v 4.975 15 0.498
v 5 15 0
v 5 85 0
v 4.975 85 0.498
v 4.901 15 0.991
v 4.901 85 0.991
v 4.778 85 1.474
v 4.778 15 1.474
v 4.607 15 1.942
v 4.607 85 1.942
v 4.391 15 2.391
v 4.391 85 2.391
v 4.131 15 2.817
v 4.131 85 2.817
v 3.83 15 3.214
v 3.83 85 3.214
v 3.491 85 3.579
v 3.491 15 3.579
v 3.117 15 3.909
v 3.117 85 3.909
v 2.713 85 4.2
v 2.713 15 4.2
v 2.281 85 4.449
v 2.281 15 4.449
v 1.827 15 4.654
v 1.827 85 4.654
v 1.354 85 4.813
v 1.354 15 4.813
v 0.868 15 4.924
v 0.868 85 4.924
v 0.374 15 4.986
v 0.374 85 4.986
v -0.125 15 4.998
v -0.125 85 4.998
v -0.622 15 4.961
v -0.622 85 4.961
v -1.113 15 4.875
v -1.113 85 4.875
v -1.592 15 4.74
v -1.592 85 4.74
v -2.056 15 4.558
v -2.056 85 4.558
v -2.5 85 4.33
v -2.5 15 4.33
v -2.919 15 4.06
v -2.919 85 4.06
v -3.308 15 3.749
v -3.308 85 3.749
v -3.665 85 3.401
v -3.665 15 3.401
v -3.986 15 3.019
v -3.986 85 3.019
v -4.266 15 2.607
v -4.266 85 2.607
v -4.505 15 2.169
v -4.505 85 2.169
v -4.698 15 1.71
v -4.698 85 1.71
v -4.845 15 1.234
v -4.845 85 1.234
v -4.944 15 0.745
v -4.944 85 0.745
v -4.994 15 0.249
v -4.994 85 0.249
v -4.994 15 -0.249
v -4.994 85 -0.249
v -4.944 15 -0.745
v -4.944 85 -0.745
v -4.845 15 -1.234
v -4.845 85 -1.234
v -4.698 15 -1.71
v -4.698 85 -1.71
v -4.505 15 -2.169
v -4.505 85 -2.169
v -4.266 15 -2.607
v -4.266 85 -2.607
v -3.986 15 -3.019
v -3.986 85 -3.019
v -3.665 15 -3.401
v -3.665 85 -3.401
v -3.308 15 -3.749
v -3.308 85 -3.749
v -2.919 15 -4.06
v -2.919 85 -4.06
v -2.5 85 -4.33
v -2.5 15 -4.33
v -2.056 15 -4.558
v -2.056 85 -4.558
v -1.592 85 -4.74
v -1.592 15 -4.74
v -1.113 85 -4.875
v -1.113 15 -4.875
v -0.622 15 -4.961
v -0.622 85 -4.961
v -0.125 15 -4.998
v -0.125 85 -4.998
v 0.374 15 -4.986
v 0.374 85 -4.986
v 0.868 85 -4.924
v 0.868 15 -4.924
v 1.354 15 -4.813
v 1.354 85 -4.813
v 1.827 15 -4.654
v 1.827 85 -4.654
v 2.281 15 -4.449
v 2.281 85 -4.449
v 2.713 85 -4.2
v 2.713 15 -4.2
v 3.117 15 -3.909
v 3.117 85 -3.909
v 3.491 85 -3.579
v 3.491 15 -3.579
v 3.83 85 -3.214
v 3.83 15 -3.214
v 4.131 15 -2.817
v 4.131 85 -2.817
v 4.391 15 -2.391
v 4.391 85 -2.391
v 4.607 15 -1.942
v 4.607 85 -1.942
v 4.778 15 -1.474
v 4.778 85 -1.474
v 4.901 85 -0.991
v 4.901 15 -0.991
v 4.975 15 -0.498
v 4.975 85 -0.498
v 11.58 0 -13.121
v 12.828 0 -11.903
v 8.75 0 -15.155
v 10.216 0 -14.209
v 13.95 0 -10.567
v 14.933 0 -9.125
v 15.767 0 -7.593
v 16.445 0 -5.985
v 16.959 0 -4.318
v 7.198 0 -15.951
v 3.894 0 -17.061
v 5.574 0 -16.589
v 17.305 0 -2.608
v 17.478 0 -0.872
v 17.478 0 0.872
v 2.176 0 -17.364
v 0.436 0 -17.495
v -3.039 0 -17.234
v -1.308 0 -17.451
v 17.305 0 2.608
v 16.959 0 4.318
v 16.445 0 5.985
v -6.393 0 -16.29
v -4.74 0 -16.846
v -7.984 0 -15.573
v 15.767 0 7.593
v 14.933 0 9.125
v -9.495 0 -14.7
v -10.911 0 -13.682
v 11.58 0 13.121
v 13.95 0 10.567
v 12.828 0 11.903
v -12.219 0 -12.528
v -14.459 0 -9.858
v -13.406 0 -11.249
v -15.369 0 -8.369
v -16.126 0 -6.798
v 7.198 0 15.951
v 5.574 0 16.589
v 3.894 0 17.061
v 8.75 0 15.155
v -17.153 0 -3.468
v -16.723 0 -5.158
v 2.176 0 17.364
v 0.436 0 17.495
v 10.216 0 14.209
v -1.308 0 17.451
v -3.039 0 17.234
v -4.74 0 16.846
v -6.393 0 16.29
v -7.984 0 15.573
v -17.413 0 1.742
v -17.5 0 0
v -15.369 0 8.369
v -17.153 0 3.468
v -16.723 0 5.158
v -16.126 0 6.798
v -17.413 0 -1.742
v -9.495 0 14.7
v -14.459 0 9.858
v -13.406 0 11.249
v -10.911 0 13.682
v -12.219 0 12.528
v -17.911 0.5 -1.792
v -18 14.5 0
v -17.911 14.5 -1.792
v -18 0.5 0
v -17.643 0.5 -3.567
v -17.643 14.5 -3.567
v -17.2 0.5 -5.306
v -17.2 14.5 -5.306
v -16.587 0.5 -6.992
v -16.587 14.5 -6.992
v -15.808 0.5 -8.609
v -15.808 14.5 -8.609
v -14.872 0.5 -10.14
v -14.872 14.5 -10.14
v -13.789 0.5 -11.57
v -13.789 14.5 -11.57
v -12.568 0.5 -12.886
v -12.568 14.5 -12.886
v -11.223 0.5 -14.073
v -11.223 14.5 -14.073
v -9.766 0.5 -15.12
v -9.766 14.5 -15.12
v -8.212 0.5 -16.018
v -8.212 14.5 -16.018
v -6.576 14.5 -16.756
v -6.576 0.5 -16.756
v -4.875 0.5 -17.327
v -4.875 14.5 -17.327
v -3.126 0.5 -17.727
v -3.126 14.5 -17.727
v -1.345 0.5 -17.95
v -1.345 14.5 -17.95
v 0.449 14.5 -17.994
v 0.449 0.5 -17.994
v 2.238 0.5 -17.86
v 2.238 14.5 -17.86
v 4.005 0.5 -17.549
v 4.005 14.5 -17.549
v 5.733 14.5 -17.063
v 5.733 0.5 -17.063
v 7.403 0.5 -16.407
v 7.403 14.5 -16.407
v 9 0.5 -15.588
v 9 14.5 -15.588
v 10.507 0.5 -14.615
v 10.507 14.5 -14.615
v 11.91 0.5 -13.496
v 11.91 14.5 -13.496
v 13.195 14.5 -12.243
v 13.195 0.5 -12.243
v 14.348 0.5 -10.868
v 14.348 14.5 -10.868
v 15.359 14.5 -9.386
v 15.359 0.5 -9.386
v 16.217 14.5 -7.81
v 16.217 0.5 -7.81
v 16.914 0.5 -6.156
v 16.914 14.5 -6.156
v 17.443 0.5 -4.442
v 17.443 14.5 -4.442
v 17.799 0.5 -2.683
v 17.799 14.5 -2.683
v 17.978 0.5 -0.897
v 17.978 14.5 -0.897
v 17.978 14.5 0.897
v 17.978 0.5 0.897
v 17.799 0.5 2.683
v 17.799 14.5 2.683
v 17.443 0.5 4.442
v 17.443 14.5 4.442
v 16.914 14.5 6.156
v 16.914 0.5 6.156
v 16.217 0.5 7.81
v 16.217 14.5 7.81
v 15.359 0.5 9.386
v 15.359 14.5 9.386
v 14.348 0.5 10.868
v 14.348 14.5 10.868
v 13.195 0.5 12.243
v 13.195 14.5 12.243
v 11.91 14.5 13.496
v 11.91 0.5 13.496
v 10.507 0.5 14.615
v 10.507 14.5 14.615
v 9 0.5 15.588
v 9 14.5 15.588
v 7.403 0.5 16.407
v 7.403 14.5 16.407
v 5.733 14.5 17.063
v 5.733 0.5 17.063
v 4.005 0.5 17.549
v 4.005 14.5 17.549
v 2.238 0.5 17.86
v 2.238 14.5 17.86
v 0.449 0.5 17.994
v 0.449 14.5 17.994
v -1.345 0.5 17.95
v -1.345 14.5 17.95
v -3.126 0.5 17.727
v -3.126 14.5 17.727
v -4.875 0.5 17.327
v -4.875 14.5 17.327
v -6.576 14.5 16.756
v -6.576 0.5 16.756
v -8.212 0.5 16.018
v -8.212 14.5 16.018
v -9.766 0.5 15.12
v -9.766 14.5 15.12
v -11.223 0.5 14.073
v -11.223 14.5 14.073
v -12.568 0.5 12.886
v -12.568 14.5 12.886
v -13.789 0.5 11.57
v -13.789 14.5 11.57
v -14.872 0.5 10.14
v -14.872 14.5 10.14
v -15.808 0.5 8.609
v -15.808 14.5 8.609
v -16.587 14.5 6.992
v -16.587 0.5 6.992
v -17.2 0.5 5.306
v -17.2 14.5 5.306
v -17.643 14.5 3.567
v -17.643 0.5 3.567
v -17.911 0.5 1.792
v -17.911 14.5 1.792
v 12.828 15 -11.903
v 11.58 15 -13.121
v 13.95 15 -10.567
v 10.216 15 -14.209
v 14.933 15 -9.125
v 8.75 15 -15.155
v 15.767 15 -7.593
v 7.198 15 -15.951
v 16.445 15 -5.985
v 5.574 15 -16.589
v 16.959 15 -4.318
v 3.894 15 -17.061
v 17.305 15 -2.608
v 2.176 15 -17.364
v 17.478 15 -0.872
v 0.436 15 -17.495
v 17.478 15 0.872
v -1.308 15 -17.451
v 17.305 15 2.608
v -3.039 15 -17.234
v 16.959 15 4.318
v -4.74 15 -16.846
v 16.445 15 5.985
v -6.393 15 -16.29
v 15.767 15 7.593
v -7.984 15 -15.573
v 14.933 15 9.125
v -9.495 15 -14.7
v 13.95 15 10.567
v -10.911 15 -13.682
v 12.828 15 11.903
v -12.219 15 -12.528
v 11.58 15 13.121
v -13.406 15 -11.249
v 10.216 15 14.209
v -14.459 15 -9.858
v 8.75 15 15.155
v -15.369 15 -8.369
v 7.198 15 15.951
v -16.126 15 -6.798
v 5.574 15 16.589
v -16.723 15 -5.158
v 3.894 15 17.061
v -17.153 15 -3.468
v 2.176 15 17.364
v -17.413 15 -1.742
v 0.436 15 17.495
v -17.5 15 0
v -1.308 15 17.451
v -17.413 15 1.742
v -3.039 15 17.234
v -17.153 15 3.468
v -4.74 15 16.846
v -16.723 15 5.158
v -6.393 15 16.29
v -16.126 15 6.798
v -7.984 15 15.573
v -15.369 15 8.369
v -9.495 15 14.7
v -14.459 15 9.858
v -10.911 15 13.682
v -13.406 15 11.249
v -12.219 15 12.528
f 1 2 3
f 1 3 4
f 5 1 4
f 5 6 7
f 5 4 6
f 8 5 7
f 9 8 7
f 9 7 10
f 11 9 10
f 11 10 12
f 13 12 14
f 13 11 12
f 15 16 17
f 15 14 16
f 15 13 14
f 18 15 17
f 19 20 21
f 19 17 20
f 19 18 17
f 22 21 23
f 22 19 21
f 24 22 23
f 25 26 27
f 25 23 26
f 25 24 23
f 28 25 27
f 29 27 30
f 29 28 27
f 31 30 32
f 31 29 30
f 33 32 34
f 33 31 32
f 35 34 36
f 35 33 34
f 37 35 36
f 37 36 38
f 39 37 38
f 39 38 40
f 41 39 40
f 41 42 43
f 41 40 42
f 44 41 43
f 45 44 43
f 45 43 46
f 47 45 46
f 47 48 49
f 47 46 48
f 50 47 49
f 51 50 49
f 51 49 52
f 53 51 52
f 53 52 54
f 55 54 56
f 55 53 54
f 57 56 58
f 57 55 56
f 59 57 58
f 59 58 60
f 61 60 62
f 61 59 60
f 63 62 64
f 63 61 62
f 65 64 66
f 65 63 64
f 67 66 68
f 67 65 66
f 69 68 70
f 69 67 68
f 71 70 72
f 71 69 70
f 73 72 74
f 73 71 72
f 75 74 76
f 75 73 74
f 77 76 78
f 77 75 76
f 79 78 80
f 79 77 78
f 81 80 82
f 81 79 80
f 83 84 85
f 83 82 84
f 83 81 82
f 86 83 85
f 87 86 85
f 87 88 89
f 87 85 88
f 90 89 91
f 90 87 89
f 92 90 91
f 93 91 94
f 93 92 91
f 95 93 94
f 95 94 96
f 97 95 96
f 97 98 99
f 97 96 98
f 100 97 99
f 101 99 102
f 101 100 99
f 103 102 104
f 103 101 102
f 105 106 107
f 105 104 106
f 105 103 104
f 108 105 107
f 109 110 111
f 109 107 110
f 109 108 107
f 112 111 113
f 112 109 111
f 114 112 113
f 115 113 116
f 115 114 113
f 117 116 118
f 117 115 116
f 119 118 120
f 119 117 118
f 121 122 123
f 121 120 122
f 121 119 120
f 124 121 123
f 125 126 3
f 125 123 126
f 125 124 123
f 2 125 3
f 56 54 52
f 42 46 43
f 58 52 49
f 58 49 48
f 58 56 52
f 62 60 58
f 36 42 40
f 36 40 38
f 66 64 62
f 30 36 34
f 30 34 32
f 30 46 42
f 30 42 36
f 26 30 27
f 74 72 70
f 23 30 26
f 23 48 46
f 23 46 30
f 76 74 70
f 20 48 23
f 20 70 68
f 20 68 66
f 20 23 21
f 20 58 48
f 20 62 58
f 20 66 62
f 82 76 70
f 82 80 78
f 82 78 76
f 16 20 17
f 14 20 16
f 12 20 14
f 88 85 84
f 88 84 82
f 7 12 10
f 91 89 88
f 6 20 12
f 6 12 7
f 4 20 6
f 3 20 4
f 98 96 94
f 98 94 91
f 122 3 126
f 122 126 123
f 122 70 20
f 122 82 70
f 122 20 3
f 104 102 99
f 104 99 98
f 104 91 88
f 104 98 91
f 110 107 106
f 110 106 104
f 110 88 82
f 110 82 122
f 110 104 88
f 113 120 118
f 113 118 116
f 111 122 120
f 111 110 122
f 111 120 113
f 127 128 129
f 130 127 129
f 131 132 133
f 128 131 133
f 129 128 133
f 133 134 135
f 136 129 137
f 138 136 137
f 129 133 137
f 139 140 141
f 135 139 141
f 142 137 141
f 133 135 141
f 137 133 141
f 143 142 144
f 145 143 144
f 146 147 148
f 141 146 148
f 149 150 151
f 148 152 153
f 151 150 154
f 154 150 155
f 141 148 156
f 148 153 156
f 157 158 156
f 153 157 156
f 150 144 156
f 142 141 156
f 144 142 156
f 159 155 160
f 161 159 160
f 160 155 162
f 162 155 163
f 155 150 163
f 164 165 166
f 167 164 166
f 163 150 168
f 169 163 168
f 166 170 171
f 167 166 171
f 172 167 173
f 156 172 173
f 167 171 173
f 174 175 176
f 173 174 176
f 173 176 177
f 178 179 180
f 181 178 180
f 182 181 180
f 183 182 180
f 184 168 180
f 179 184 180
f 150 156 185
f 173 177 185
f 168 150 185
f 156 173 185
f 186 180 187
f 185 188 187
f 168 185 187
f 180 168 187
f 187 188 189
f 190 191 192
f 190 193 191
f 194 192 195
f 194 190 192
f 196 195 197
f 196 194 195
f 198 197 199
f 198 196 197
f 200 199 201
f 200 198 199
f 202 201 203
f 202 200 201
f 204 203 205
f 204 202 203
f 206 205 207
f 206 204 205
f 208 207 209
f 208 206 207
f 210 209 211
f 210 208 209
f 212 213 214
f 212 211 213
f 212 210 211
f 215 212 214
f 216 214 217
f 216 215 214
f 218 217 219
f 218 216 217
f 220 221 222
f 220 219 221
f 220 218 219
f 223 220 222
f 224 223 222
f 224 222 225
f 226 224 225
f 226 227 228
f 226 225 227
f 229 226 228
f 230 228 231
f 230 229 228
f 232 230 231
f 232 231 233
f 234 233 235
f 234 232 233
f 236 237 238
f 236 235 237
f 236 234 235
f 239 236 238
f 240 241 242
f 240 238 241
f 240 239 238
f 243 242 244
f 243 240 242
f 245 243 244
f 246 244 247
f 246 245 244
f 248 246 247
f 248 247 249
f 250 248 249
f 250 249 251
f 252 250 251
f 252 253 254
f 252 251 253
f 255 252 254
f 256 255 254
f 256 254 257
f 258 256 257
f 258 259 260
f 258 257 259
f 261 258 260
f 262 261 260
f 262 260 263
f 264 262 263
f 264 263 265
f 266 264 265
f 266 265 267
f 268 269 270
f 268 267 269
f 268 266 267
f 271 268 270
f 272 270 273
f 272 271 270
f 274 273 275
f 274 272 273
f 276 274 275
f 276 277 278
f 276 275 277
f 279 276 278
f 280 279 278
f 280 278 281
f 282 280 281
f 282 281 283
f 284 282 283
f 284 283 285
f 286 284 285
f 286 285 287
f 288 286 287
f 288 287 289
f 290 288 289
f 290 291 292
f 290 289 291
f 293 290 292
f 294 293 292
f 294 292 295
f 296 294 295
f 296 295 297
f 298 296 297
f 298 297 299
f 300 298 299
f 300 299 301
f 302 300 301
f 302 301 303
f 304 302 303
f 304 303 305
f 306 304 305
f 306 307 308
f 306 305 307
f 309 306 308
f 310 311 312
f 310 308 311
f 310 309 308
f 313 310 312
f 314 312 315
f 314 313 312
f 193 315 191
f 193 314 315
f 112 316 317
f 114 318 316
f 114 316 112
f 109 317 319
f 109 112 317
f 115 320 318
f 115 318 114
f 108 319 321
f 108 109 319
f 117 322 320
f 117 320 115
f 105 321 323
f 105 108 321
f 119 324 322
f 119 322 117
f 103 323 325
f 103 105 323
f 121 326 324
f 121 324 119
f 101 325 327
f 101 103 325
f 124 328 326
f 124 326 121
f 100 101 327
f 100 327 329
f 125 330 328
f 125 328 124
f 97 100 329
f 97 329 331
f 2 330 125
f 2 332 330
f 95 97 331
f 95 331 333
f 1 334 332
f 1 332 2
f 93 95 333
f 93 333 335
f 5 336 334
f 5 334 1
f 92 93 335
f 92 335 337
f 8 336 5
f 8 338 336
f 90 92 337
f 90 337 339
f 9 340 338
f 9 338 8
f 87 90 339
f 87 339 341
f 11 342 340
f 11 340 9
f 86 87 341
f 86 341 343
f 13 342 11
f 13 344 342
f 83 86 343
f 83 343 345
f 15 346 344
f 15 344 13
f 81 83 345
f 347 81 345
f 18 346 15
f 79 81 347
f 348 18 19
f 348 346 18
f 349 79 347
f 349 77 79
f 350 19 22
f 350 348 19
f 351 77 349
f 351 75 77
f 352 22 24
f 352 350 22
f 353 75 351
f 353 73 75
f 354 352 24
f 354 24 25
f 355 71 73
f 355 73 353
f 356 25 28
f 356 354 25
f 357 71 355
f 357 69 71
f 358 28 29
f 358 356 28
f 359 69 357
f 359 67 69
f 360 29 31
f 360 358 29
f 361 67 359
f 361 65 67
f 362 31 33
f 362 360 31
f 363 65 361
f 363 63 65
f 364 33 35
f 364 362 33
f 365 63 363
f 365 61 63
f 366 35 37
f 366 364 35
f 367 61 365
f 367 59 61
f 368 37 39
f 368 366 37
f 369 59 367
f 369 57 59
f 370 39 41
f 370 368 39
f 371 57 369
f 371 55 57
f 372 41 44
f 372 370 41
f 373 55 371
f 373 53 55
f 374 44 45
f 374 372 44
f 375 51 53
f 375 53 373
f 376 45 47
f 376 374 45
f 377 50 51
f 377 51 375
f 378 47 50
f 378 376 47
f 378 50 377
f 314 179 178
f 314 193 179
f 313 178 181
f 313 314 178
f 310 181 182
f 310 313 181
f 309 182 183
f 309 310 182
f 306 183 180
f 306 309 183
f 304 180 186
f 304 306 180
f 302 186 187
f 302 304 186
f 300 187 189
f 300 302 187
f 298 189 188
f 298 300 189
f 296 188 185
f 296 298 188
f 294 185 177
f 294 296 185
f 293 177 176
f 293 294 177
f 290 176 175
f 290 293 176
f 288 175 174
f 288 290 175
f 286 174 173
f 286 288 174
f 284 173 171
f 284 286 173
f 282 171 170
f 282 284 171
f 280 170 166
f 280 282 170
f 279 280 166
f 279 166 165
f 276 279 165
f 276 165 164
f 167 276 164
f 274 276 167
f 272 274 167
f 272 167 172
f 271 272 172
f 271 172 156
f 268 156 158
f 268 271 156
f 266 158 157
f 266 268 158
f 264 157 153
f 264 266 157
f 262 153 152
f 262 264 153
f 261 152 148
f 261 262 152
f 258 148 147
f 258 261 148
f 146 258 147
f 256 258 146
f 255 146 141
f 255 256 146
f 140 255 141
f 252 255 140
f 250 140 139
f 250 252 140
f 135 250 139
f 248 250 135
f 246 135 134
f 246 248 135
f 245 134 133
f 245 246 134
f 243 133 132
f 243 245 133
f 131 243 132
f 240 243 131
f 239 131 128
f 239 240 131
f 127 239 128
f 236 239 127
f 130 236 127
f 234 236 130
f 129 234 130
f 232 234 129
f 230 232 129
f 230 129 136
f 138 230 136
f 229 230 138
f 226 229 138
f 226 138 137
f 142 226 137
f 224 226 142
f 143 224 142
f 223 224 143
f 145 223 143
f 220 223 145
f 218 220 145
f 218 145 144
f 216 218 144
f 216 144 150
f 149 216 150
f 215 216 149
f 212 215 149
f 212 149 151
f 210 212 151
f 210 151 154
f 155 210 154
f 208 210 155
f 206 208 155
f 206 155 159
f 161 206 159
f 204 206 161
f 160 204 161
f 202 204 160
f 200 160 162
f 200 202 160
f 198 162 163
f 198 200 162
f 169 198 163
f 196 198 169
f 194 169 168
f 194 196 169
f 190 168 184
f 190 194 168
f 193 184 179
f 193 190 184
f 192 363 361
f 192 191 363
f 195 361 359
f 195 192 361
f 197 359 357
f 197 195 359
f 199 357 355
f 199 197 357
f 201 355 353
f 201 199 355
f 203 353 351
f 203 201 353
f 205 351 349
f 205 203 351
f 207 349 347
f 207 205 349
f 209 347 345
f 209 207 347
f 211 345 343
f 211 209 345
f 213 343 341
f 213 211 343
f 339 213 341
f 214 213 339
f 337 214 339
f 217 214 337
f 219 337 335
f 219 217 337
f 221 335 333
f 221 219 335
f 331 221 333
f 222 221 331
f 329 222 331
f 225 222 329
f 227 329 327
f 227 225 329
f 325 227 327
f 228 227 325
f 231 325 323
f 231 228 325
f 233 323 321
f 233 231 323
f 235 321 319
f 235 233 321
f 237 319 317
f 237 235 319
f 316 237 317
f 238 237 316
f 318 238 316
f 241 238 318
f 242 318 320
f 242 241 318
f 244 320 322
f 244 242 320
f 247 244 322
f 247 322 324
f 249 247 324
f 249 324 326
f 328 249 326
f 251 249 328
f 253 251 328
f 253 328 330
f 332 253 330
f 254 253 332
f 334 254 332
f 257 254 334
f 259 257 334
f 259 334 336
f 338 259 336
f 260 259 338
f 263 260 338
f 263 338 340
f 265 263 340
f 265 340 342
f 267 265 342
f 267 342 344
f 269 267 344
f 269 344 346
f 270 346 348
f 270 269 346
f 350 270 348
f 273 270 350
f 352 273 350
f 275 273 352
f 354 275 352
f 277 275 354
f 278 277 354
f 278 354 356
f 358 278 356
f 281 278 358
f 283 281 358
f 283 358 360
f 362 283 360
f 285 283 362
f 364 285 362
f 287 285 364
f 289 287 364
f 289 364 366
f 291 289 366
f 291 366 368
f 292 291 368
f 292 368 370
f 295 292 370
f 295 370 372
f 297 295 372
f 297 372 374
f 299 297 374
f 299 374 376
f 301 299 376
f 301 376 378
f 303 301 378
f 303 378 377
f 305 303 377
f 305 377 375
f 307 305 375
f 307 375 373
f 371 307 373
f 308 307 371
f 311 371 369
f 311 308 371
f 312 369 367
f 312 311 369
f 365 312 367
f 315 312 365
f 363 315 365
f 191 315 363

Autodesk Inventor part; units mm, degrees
ref_plane "YZ Plane" through (0, 0, 0) normal (1, 0, 0) x (0, 1, 0)
ref_plane "XZ Plane" through (0, 0, 0) normal (0, 1, 0) x (-1, 0, 0)
ref_plane "XY Plane" through (0, 0, 0) normal (0, 0, 1) x (1, 0, 0)
sketch "Esboço1" plane through (0, 0, 0) normal (0, 1, 0) x (-1, 0, 0)
  circle A0 centre (0, 0) radius 18
  dimension "d0" = 36
extrude "Extrusão1" add sketch "Esboço1" along normal blind 15
sketch "Esboço2" plane through (0, 15, 0) normal (0, 1, 0) x (1, 0, 0)
  circle A0 centre (0, 0) radius 5
  dimension "d3" = 10
extrude "Extrusão2" add sketch "Esboço2" along normal blind 70
thread "Rosca1" size "M10x1.5" class "6g" standard "ANSI Metric M Profile" length 15 offset 55
chamfer "Chamfer1" distance 0.5 angle 45 1 edges at (18, 0, 0)
chamfer "Chamfer2" distance 0.5 angle 45 1 edges at (18, 15, 0)
equation "\"Raio_vergadura\" = Espessura"
equation "\"Largura_alívio_de_vergadura\" = Espessura"
equation "\"Profundidade_alívio_de_vergadura\" = 0.5 * Espessura"
equation "\"Tamanho_alívio_de_dobra\" = 4 * Espessura"
equation "\"Remanescente_mínimo\" = 2 * Espessura"
equation "\"Raiodetransição\" = Raio_vergadura"
equation "\"Tamanho_de_raio_de_Jacobi\" = Raio_vergadura"
equation "\"TamanhoFolga\" = Espessura"
equation "\"Espessura\" = 0.5"
properties part number "Probe" material "Aluminum 6061"
